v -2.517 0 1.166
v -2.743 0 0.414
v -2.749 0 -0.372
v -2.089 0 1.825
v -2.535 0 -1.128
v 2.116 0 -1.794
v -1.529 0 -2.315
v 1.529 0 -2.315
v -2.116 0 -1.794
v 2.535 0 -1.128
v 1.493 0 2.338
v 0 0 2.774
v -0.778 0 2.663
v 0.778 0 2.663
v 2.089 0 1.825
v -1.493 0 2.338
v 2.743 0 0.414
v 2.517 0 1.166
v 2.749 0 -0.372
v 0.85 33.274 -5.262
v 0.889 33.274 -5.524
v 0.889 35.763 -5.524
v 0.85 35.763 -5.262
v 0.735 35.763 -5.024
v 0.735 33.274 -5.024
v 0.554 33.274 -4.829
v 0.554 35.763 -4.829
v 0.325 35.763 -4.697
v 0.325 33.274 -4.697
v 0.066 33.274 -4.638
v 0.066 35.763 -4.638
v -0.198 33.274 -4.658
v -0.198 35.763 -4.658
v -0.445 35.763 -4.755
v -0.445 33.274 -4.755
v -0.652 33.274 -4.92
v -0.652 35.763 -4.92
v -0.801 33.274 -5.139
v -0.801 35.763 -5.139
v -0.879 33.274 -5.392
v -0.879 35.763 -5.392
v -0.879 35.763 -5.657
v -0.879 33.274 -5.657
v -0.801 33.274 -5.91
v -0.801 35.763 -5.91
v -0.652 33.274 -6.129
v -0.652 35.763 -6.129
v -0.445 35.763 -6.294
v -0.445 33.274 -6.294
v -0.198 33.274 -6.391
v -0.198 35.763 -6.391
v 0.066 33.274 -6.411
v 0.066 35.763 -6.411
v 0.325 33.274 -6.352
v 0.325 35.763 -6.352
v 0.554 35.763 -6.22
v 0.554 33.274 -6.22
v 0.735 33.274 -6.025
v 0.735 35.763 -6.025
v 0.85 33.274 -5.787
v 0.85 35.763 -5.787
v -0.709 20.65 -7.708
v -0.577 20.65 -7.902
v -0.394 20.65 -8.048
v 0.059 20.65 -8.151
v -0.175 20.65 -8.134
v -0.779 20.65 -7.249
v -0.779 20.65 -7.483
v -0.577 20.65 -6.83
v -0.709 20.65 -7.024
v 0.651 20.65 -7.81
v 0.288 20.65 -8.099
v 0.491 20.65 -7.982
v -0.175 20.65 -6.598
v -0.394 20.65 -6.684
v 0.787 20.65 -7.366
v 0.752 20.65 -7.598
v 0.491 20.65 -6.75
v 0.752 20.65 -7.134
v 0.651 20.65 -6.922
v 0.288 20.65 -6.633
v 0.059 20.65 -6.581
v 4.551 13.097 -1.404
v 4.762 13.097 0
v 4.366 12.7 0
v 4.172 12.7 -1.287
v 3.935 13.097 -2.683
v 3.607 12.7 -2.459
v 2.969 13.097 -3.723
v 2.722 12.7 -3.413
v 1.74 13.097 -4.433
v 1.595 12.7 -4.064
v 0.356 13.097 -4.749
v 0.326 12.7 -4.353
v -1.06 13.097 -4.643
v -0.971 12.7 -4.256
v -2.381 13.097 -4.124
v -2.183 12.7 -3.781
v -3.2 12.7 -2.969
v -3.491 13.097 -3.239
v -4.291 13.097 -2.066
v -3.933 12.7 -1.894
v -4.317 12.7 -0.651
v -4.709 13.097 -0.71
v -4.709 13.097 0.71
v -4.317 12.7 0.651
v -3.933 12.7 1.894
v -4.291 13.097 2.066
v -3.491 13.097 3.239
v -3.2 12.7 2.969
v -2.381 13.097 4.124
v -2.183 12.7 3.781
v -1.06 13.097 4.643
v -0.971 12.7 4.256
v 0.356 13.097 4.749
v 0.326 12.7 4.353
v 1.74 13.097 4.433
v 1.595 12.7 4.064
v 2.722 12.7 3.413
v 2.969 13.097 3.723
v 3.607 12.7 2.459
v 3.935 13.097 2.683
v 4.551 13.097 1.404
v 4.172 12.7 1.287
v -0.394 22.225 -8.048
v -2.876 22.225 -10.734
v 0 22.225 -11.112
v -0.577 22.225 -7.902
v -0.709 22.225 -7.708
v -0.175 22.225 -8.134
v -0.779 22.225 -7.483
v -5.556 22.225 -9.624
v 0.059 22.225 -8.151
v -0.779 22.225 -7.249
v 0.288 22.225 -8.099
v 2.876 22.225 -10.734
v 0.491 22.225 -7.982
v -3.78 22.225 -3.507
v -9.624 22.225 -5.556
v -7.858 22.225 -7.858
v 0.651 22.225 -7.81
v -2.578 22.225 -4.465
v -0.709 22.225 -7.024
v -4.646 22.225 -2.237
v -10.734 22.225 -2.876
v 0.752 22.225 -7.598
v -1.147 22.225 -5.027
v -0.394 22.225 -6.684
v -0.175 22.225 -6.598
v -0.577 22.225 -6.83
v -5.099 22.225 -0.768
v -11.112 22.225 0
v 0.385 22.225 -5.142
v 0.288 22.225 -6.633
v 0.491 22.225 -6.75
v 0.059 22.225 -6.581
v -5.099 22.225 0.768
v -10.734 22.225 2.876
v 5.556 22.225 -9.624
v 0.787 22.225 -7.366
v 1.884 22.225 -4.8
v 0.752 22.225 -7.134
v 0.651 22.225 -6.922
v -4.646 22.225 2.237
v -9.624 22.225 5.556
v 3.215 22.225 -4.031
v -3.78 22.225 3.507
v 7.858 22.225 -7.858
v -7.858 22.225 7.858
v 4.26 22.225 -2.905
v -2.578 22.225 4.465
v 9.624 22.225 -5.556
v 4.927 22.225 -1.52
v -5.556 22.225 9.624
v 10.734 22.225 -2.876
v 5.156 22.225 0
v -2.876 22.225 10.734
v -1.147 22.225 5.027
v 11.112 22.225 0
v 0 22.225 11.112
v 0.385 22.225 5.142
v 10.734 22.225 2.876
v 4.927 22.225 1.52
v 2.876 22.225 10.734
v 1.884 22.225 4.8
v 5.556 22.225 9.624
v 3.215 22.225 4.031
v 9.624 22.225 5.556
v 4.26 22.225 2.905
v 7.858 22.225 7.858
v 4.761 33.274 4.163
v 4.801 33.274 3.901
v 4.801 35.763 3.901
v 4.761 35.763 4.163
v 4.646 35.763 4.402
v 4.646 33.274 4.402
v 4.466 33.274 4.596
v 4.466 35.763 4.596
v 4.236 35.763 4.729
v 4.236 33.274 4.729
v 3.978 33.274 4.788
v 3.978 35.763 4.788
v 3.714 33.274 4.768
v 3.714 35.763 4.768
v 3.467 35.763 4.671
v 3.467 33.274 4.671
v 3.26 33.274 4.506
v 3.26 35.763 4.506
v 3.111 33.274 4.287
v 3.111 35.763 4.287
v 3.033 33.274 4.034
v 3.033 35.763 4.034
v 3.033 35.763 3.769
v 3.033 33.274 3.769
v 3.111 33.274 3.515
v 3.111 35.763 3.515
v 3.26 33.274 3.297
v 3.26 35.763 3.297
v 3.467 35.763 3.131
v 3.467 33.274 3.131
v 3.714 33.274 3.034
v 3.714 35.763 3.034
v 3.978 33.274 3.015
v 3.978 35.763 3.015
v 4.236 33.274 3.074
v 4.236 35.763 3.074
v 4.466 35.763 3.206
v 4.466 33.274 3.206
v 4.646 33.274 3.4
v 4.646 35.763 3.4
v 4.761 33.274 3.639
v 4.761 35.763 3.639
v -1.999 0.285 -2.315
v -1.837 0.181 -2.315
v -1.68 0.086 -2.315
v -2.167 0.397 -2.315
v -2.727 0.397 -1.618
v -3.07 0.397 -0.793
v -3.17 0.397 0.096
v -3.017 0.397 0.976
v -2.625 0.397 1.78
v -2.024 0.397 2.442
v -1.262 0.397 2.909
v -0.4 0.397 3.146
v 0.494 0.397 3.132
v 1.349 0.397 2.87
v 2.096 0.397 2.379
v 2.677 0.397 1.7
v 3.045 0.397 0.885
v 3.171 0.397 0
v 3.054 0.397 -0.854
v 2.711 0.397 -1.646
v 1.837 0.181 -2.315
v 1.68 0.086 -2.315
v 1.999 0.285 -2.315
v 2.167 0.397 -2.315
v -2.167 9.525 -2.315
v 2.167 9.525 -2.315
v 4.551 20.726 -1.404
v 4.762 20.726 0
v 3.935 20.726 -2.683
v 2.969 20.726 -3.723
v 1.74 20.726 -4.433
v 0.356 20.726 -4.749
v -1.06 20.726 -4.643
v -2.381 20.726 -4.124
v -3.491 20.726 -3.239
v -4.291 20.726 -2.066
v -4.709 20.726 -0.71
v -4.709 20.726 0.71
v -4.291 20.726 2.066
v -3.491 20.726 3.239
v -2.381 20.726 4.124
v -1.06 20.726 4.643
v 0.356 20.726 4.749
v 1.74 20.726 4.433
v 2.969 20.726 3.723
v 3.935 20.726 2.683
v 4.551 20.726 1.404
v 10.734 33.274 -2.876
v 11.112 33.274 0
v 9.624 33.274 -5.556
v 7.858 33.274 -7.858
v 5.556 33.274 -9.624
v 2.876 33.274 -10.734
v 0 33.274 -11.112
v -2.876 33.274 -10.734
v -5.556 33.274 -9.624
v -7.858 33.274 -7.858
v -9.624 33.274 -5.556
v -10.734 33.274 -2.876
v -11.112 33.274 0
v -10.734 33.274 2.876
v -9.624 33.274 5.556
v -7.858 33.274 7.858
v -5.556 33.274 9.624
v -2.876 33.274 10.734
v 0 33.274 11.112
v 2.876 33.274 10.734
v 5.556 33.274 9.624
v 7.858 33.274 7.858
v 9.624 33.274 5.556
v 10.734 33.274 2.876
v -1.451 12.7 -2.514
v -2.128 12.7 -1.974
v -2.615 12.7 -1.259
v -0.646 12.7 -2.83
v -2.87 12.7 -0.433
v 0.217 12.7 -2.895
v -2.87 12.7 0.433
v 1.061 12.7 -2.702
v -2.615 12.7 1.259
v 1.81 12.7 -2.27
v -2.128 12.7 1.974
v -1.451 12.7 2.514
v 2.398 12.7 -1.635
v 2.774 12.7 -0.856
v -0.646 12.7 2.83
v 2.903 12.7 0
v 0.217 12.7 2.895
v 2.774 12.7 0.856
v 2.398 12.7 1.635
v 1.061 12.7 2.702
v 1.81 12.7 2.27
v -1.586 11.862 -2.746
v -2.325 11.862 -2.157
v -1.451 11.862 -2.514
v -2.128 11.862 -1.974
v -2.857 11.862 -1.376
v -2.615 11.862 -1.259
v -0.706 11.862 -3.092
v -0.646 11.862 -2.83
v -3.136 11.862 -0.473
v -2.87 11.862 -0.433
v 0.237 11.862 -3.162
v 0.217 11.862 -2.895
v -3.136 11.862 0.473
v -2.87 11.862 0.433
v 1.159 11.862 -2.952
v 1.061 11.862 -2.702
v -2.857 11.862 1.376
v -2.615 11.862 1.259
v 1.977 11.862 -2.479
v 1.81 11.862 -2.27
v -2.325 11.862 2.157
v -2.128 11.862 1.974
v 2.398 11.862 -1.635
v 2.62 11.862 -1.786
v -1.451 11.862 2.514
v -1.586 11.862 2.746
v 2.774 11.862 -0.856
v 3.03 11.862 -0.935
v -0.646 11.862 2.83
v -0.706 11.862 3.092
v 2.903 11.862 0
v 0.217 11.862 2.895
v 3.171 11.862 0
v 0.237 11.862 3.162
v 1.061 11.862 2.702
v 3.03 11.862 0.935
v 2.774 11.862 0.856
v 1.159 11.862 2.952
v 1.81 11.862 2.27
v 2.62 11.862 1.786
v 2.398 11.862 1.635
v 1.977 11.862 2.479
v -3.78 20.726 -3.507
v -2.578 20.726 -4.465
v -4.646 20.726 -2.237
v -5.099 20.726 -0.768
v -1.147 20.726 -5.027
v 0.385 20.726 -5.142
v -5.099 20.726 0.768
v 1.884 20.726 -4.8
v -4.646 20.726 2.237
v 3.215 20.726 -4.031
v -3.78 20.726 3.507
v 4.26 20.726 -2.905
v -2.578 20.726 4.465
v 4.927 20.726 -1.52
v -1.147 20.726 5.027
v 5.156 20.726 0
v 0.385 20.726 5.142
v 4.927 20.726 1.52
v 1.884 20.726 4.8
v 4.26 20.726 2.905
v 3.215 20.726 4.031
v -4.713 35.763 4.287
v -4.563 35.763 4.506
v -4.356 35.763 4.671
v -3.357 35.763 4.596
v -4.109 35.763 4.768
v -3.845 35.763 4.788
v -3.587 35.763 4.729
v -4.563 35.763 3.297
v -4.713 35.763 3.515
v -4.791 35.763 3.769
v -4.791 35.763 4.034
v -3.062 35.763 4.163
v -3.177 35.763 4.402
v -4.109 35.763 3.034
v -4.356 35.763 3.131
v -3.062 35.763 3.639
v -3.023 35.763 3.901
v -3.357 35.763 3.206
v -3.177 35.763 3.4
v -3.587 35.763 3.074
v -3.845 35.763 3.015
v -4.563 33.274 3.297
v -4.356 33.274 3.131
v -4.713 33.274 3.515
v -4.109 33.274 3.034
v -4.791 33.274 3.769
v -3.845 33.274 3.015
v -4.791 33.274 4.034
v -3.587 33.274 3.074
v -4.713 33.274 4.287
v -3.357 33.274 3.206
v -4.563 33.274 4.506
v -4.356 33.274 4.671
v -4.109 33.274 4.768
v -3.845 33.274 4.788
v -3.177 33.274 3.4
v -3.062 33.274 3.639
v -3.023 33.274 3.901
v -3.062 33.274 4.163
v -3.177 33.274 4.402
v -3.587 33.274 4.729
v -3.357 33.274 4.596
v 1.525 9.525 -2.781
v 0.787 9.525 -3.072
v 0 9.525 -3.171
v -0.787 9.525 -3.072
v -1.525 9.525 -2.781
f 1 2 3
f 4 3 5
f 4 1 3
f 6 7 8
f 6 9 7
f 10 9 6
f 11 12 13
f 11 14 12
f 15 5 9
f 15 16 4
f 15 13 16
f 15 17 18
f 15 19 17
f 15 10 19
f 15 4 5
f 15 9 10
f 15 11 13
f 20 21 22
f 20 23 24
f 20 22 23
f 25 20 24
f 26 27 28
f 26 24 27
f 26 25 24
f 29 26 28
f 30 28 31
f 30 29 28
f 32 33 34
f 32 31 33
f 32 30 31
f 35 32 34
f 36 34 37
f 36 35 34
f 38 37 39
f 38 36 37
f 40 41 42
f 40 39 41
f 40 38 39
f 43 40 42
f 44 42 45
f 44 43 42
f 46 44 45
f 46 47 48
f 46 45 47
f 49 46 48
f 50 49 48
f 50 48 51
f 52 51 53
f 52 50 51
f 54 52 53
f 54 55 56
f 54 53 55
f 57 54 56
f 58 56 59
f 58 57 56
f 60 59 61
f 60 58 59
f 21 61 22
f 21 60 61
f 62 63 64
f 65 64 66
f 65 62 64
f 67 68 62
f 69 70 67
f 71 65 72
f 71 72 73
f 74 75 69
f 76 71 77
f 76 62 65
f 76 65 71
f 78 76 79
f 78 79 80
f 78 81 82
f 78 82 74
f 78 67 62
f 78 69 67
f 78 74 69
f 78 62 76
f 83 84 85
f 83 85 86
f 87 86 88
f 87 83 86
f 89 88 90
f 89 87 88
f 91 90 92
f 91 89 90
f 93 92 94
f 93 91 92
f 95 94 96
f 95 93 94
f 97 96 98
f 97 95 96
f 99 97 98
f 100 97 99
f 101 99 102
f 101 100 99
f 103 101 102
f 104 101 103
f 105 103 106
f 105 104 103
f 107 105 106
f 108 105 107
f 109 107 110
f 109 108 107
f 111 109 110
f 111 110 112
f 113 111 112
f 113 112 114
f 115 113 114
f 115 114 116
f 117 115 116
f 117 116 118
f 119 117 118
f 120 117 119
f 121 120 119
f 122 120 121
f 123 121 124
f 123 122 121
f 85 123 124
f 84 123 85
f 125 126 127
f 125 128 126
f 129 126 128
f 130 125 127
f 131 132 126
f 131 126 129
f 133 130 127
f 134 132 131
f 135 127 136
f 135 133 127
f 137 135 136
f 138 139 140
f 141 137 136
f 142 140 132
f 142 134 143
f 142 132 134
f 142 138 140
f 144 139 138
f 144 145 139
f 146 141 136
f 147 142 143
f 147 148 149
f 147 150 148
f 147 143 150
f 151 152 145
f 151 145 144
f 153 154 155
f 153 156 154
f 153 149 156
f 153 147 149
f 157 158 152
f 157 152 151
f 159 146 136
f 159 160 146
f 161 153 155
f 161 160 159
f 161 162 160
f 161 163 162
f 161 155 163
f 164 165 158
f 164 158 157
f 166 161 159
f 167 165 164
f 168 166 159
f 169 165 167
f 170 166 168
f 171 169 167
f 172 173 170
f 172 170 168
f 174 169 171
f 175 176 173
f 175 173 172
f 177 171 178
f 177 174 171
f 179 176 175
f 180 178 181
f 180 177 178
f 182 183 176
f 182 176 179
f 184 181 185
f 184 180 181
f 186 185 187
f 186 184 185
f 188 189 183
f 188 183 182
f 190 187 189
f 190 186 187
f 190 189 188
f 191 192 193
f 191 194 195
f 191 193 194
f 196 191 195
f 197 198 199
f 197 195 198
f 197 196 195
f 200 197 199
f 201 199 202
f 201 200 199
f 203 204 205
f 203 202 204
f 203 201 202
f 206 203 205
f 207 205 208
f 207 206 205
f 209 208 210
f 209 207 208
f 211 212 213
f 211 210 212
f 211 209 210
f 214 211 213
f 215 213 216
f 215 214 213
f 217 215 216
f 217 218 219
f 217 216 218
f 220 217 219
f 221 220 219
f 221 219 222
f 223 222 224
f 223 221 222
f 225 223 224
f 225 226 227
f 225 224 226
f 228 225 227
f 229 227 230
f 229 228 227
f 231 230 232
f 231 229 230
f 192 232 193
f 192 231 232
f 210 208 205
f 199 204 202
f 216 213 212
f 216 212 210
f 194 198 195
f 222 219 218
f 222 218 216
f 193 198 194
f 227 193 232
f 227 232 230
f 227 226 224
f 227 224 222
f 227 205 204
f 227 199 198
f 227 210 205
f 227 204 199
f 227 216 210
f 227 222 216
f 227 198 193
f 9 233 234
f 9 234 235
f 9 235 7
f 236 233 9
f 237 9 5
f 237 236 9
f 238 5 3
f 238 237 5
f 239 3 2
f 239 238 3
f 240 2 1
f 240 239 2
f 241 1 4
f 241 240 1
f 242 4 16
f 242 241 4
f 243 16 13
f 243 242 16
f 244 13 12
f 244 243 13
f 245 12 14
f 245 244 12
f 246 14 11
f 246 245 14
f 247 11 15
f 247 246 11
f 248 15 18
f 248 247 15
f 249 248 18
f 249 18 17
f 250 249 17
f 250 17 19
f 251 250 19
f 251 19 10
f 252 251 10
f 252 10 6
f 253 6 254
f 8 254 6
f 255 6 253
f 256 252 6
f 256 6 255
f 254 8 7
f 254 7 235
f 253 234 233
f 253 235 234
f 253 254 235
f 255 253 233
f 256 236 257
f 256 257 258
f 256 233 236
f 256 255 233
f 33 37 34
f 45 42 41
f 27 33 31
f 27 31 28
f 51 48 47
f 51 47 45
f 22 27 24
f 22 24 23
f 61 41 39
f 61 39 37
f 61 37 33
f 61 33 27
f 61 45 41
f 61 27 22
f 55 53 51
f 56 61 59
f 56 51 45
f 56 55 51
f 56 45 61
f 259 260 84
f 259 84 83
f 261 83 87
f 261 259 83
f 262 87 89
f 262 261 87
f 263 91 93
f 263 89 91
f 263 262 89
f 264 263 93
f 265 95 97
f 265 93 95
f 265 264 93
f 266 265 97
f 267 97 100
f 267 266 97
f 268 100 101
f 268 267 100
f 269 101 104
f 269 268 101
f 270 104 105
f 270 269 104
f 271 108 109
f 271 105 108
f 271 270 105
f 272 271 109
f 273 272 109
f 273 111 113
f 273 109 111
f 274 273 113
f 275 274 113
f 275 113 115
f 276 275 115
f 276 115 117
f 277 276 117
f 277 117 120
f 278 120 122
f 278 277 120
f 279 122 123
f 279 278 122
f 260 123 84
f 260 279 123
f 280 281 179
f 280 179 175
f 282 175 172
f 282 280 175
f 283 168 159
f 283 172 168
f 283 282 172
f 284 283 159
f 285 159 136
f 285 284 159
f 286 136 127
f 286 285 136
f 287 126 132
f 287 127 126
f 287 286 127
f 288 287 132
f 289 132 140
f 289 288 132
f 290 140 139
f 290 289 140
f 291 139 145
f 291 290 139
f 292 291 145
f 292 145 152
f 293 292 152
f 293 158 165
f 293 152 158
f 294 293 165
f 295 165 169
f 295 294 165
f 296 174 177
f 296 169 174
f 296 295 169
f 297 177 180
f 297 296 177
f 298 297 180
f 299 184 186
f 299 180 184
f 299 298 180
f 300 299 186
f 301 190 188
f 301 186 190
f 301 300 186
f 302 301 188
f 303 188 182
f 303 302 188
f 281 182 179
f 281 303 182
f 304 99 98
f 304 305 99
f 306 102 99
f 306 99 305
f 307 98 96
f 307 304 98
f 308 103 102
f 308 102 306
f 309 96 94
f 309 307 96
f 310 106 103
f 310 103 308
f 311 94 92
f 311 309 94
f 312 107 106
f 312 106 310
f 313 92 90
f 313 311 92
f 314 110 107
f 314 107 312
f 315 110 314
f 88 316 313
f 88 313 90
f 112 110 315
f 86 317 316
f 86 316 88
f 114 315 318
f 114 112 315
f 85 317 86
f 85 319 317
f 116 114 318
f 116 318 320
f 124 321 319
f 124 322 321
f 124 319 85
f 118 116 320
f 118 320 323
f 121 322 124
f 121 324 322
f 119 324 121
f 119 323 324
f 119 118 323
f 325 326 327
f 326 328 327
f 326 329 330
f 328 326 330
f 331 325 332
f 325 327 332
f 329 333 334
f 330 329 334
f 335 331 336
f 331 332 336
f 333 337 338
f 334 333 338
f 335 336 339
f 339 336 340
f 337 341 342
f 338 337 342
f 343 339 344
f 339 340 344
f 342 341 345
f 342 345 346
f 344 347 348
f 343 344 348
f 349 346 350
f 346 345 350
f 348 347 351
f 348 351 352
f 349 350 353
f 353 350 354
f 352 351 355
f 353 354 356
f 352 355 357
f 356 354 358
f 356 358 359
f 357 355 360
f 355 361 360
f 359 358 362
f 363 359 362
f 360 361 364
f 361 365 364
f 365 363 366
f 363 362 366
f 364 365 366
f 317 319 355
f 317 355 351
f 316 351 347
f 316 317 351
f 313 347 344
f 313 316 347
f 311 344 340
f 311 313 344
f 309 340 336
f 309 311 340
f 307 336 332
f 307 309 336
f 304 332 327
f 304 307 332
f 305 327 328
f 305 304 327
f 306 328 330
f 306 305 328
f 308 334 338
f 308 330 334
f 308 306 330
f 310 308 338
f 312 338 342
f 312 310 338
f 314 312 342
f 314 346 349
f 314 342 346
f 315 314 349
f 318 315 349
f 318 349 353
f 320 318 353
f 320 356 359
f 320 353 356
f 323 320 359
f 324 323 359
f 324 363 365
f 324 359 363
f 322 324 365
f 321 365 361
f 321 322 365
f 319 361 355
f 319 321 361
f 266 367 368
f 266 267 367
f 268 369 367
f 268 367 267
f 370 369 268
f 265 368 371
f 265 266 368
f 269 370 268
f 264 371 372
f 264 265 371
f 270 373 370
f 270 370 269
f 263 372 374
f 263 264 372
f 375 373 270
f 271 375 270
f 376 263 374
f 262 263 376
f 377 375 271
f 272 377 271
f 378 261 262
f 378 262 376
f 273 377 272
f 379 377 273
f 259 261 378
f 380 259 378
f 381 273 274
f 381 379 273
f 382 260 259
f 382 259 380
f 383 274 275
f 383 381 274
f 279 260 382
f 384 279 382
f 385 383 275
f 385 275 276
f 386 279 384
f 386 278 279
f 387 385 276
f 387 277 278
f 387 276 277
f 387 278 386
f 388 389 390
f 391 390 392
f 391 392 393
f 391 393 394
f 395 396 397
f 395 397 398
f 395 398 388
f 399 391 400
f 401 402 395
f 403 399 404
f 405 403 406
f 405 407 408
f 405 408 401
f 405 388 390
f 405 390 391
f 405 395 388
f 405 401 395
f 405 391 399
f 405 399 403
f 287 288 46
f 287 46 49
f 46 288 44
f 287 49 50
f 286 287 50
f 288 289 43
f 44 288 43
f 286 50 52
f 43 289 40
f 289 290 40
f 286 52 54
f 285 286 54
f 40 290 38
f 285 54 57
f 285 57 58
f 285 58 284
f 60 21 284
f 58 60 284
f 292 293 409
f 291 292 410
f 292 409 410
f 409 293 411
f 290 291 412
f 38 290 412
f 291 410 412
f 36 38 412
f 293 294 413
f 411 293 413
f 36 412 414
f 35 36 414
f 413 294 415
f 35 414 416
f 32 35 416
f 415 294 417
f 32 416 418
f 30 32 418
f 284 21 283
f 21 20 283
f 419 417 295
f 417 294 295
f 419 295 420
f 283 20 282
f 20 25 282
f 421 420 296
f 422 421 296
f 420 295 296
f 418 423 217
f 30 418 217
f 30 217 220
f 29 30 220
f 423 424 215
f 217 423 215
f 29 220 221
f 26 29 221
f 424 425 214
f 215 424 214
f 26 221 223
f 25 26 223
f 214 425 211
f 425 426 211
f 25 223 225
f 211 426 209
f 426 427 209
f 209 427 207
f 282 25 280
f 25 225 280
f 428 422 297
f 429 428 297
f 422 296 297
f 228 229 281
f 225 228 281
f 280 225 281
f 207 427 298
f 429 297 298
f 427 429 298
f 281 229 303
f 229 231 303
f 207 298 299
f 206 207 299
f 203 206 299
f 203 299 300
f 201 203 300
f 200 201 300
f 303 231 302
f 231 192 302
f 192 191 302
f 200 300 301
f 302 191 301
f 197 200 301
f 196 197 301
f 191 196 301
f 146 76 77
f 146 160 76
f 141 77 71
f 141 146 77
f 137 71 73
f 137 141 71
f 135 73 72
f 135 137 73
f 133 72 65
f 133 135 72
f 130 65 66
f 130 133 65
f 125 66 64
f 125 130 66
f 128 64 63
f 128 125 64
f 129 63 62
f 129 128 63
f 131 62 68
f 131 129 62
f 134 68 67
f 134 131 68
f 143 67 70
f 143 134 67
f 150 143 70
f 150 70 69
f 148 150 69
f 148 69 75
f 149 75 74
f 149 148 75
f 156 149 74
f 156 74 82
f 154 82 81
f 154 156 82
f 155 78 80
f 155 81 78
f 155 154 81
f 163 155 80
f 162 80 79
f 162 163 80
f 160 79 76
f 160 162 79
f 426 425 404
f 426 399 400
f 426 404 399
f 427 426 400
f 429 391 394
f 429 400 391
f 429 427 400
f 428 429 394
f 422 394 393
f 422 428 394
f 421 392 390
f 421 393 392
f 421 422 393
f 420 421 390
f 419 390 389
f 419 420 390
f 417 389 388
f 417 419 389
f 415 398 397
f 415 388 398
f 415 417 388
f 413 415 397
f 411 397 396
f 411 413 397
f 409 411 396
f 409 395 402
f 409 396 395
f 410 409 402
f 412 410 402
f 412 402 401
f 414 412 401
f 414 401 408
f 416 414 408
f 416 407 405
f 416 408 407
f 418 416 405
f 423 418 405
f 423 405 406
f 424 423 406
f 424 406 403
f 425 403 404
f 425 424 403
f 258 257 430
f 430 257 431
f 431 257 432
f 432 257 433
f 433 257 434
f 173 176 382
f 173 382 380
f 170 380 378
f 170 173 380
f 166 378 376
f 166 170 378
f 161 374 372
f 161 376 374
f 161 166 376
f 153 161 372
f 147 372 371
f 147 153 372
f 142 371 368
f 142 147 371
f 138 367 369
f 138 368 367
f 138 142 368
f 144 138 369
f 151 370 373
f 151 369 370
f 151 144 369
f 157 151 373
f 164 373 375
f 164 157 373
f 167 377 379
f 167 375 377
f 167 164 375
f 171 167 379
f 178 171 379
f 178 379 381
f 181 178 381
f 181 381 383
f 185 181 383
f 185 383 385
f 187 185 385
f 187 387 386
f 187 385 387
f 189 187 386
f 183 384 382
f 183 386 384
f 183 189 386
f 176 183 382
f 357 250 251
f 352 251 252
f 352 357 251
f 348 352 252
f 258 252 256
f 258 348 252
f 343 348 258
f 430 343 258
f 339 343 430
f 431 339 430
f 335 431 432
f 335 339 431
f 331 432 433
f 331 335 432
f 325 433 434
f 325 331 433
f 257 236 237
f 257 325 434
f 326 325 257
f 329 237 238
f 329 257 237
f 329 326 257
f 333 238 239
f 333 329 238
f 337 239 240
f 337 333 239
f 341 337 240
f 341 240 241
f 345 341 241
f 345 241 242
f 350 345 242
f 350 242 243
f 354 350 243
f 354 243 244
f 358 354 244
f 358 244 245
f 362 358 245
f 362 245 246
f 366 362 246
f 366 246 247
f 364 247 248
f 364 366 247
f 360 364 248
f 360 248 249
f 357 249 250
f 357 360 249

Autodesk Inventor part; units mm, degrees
ref_plane "YZ Plane" through (0, 0, 0) normal (1, 0, 0) x (0, 1, 0)
ref_plane "XZ Plane" through (0, 0, 0) normal (0, 1, 0) x (-1, 0, 0)
ref_plane "XY Plane" through (0, 0, 0) normal (0, 0, 1) x (1, 0, 0)
sketch "Sketch1" plane through (0, 0, 0) normal (0, 0, 1) x (1, 0, 0)
  line L0 (0, 0) -> (3.1712, 0)
  line L1 (3.1712, 0) -> (3.1712, 11.8618)
  line L2 (3.1712, 11.8618) -> (0, 11.8618)
  line L3 (0, 11.8618) -> (0, 0)
  line L4 (0, 11.8618) -> (2.9028, 11.8618)
  line L5 (2.9028, 11.8618) -> (2.9028, 12.7)
  line L6 (2.9028, 12.7) -> (0, 12.7)
  line L7 (0, 12.7) -> (0, 11.8618)
  line L8 (0, 12.7) -> (4.7625, 12.7)
  line L9 (4.7625, 12.7) -> (4.7625, 20.7264)
  line L10 (4.7625, 20.7264) -> (0, 20.7264)
  line L11 (0, 20.7264) -> (0, 12.7)
  line L12 (0, 20.7264) -> (5.1562, 20.7264)
  line L13 (5.1562, 20.7264) -> (5.1562, 22.225)
  line L14 (5.1562, 22.225) -> (0, 22.225)
  line L15 (0, 22.225) -> (0, 20.7264)
  line L16 (0, 22.225) -> (11.1125, 22.225)
  line L17 (11.1125, 22.225) -> (11.1125, 33.274)
  line L18 (11.1125, 33.274) -> (0, 33.274)
  line L19 (0, 33.274) -> (0, 22.225)
  dimension "d0" = 22.225
  dimension "d1" = 9.525
  dimension "d2" = 1.4986
  dimension "d3" = 0.8382
  dimension "d4" = 3.1712
  dimension "d5" = 5.1562
  dimension "d6" = 11.049
  dimension "d7" = 11.1125
  dimension "d8" = 4.7625
revolve "Revolution1" add sketch "Sketch1" angle 360 about axis through (0, 33.274, 0) along (0, -1, 0)
chamfer "Chamfer1" distance 0.3969 angle 45 2 edges at (-3.1712, 0, 0) (-4.7625, 12.7, 0)
sketch "Sketch2" plane through (0, 22.225, 0) normal (0, -1, 0) x (1, 0, 0)
  circle A0 centre (0, -7.366) radius 0.7874
  circle A1 centre (0, 0) radius 11.1125 projected
  point P0 (0, 0)
  dimension "d13" = 1.5748
  dimension "d14" = 7.366
extrude "Extrusion1" add sketch "Sketch2" along normal blind 1.5748 contours A0
sketch "Sketch3" plane through (0, 0, 0) normal (0, -1, 0) x (1, 0, 0)
  line L0 (-2.1671, -2.3152) -> (2.1671, -2.3152)
  circle A0 centre (0, 0) radius 3.1712 projected
  point P0 (0, 0)
  dimension "d18" = 5.4864
extrude "Extrusion2" cut sketch "Sketch3" against normal blind 9.525 contours L0 A0 picked at (-0.5411, -2.4515)
sketch "Sketch4" plane through (0, 33.274, 0) normal (0, 1, 0) x (1, 0, 0)
  circle A0 centre (0, 0) radius 5.5245 construction
  circle A1 centre (3.9116, -3.9012) radius 0.889
  circle A2 centre (-3.9116, -3.9012) radius 0.889
  circle A3 centre (0, 5.5245) radius 0.889
  line L0 (3.9116, -3.9012) -> (-3.9116, -3.9012) construction
  line L1 (0, 0) -> (0, 11.1125) construction
  circle A4 centre (0, 0) radius 11.1125 construction
  dimension "d21" = 11.049
  dimension "d22" = 7.8232
  dimension "d23" = 1.778
extrude "Extrusion3" add sketch "Sketch4" along normal blind 2.4892
properties part number "TT_Electronics_Encoder_6127V1A360L.5FS" material "Aluminum 6061"
